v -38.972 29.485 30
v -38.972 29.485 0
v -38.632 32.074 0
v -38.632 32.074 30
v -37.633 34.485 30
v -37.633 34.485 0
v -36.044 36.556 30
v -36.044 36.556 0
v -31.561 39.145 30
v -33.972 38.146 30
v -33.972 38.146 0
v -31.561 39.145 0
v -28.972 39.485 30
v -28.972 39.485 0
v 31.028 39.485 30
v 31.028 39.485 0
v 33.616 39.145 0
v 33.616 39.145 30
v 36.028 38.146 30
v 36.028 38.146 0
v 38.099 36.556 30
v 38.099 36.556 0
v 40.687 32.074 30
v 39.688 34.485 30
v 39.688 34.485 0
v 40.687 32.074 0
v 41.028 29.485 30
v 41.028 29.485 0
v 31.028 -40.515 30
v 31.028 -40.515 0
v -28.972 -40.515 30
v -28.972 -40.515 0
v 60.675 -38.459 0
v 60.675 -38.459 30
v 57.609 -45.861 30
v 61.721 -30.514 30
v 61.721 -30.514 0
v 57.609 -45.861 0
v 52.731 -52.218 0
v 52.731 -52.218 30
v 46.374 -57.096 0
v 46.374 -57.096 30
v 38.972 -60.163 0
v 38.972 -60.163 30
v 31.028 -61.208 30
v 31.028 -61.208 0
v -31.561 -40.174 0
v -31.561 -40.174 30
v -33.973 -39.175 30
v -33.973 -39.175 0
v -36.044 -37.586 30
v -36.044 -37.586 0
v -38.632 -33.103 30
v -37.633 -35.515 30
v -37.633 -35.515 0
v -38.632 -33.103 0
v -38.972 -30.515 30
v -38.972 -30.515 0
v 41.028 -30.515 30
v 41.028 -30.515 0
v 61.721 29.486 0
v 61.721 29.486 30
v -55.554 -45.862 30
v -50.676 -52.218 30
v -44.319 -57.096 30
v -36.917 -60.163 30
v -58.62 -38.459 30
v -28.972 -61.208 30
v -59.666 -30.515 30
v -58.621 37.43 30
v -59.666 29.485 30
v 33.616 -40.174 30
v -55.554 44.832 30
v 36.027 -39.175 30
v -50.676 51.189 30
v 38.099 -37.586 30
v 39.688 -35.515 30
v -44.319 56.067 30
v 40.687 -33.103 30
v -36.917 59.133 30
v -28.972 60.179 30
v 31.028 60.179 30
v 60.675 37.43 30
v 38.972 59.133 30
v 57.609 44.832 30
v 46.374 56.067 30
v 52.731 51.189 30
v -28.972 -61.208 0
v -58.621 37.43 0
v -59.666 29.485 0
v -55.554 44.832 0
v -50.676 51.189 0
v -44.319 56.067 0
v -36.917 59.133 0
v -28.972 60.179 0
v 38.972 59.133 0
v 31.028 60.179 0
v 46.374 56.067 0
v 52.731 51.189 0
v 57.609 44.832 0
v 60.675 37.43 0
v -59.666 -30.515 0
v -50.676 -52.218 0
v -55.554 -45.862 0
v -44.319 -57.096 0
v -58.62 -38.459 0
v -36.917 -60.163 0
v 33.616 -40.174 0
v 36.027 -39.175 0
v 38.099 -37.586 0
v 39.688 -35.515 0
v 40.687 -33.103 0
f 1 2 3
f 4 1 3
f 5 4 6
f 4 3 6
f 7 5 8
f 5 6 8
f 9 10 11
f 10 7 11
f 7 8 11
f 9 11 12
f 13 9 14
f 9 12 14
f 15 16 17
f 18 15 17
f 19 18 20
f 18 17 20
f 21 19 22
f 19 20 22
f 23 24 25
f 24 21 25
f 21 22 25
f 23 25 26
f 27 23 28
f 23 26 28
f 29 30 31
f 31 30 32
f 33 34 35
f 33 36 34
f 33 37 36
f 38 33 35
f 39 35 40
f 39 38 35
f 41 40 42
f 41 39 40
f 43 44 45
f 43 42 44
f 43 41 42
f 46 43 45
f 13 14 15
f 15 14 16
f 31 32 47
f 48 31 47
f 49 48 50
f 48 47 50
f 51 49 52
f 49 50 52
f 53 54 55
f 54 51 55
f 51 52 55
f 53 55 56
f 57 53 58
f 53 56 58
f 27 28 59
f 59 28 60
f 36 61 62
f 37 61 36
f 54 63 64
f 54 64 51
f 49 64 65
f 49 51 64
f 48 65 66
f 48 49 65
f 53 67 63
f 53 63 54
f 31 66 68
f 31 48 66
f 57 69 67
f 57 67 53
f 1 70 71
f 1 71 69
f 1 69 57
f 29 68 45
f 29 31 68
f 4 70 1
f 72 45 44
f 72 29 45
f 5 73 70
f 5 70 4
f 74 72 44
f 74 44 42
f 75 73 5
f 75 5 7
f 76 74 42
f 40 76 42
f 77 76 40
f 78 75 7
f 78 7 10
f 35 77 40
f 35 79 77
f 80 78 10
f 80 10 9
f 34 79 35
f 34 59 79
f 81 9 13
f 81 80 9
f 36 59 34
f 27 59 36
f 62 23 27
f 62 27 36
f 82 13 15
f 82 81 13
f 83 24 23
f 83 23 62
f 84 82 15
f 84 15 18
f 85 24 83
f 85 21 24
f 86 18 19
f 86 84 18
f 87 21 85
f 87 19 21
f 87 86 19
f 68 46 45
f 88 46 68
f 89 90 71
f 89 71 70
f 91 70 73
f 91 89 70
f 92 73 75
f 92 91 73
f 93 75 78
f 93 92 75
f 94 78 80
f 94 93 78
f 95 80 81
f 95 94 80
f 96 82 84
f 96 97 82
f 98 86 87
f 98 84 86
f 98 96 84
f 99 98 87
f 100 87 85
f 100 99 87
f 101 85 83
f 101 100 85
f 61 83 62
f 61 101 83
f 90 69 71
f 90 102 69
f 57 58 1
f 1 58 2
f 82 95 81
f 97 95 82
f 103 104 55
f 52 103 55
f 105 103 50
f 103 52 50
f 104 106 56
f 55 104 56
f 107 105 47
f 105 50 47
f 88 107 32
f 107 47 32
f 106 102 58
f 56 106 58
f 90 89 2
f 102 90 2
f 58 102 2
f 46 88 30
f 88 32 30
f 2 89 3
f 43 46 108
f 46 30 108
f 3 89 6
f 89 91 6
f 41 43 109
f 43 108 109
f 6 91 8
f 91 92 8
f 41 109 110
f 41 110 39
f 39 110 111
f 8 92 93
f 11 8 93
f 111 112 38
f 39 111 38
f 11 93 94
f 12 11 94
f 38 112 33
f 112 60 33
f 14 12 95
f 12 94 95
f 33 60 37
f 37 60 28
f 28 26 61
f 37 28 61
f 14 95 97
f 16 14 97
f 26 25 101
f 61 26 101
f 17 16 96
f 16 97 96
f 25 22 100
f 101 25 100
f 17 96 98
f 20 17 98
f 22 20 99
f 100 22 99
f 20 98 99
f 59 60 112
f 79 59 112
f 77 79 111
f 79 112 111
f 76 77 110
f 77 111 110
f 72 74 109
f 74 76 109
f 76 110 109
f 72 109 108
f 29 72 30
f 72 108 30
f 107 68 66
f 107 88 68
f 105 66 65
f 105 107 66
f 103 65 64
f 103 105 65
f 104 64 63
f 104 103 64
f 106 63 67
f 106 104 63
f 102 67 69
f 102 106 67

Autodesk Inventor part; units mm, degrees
ref_plane "YZ Plane" through (0, 0, 0) normal (1, 0, 0) x (0, 1, 0)
ref_plane "XZ Plane" through (0, 0, 0) normal (0, 1, 0) x (-1, 0, 0)
ref_plane "Plano de trabalho1" through (0, 0, 0) normal (0, 0, 1) x (1, 0, 0)
sketch "Esboço1" plane through (0, 0, 0) normal (0, 0, 1) x (1, 0, 0)
  arc A0 (-38.9725, -30.5146) -> (-28.9725, -40.5146) centre (-28.9725, -30.5146) ccw projected
  line L0 (31.0275, -40.5146) -> (-28.9725, -40.5146) projected
  arc A1 (31.0275, -40.5146) -> (41.0275, -30.5146) centre (31.0275, -30.5146) ccw projected
  line L1 (41.0275, 29.4854) -> (41.0275, -30.5146) projected
  arc A2 (41.0275, 29.4854) -> (31.0275, 39.4854) centre (31.0275, 29.4854) ccw projected
  line L2 (-28.9725, 39.4854) -> (31.0275, 39.4854) projected
  arc A3 (-28.9725, 39.4854) -> (-38.9725, 29.4854) centre (-28.9725, 29.4854) ccw projected
  line L3 (-38.9725, -30.5146) -> (-38.9725, 29.4854) projected
  circle A4 centre (1.0275, -0.5146) radius 5 projected
  arc A5 (-52.2205, -30.5146) -> (-28.9725, -53.7625) centre (-28.9725, -30.5146) ccw
  line L4 (-52.2205, -30.5146) -> (-52.2205, 29.4854)
  arc A6 (-28.9725, 52.7334) -> (-52.2205, 29.4854) centre (-28.9725, 29.4854) ccw
  line L5 (-28.9725, 52.7334) -> (31.0275, 52.7334)
  arc A7 (54.2754, 29.4855) -> (31.0275, 52.7334) centre (31.0275, 29.4854) ccw
  line L6 (54.2754, 29.4855) -> (54.2754, -30.5145)
  arc A8 (31.0275, -53.7625) -> (54.2754, -30.5145) centre (31.0275, -30.5146) ccw
  line L7 (31.0275, -53.7625) -> (-28.9725, -53.7625)
  arc A9 (-59.6663, -30.5146) -> (-28.9725, -61.2084) centre (-28.9725, -30.5146) ccw
  line L8 (-59.6663, -30.5146) -> (-59.6664, 29.4854)
  arc A10 (-28.9725, 60.1793) -> (-59.6664, 29.4854) centre (-28.9725, 29.4854) ccw
  line L9 (-28.9725, 60.1793) -> (31.0275, 60.1793)
  arc A11 (61.7213, 29.4855) -> (31.0275, 60.1793) centre (31.0275, 29.4854) ccw
  line L10 (61.7213, 29.4855) -> (61.7213, -30.5145)
  arc A12 (31.0275, -61.2084) -> (61.7213, -30.5145) centre (31.0275, -30.5146) ccw
  line L11 (31.0275, -61.2084) -> (-28.9725, -61.2084)
  point P0 (0, 0)
extrude "Extrusão1" add sketch "Esboço1" along normal blind 30 contours L4 A6 L5 A7 L6 A8 L7 A5 | L8 A10 L9 A11 L10 A12 L11 A9
